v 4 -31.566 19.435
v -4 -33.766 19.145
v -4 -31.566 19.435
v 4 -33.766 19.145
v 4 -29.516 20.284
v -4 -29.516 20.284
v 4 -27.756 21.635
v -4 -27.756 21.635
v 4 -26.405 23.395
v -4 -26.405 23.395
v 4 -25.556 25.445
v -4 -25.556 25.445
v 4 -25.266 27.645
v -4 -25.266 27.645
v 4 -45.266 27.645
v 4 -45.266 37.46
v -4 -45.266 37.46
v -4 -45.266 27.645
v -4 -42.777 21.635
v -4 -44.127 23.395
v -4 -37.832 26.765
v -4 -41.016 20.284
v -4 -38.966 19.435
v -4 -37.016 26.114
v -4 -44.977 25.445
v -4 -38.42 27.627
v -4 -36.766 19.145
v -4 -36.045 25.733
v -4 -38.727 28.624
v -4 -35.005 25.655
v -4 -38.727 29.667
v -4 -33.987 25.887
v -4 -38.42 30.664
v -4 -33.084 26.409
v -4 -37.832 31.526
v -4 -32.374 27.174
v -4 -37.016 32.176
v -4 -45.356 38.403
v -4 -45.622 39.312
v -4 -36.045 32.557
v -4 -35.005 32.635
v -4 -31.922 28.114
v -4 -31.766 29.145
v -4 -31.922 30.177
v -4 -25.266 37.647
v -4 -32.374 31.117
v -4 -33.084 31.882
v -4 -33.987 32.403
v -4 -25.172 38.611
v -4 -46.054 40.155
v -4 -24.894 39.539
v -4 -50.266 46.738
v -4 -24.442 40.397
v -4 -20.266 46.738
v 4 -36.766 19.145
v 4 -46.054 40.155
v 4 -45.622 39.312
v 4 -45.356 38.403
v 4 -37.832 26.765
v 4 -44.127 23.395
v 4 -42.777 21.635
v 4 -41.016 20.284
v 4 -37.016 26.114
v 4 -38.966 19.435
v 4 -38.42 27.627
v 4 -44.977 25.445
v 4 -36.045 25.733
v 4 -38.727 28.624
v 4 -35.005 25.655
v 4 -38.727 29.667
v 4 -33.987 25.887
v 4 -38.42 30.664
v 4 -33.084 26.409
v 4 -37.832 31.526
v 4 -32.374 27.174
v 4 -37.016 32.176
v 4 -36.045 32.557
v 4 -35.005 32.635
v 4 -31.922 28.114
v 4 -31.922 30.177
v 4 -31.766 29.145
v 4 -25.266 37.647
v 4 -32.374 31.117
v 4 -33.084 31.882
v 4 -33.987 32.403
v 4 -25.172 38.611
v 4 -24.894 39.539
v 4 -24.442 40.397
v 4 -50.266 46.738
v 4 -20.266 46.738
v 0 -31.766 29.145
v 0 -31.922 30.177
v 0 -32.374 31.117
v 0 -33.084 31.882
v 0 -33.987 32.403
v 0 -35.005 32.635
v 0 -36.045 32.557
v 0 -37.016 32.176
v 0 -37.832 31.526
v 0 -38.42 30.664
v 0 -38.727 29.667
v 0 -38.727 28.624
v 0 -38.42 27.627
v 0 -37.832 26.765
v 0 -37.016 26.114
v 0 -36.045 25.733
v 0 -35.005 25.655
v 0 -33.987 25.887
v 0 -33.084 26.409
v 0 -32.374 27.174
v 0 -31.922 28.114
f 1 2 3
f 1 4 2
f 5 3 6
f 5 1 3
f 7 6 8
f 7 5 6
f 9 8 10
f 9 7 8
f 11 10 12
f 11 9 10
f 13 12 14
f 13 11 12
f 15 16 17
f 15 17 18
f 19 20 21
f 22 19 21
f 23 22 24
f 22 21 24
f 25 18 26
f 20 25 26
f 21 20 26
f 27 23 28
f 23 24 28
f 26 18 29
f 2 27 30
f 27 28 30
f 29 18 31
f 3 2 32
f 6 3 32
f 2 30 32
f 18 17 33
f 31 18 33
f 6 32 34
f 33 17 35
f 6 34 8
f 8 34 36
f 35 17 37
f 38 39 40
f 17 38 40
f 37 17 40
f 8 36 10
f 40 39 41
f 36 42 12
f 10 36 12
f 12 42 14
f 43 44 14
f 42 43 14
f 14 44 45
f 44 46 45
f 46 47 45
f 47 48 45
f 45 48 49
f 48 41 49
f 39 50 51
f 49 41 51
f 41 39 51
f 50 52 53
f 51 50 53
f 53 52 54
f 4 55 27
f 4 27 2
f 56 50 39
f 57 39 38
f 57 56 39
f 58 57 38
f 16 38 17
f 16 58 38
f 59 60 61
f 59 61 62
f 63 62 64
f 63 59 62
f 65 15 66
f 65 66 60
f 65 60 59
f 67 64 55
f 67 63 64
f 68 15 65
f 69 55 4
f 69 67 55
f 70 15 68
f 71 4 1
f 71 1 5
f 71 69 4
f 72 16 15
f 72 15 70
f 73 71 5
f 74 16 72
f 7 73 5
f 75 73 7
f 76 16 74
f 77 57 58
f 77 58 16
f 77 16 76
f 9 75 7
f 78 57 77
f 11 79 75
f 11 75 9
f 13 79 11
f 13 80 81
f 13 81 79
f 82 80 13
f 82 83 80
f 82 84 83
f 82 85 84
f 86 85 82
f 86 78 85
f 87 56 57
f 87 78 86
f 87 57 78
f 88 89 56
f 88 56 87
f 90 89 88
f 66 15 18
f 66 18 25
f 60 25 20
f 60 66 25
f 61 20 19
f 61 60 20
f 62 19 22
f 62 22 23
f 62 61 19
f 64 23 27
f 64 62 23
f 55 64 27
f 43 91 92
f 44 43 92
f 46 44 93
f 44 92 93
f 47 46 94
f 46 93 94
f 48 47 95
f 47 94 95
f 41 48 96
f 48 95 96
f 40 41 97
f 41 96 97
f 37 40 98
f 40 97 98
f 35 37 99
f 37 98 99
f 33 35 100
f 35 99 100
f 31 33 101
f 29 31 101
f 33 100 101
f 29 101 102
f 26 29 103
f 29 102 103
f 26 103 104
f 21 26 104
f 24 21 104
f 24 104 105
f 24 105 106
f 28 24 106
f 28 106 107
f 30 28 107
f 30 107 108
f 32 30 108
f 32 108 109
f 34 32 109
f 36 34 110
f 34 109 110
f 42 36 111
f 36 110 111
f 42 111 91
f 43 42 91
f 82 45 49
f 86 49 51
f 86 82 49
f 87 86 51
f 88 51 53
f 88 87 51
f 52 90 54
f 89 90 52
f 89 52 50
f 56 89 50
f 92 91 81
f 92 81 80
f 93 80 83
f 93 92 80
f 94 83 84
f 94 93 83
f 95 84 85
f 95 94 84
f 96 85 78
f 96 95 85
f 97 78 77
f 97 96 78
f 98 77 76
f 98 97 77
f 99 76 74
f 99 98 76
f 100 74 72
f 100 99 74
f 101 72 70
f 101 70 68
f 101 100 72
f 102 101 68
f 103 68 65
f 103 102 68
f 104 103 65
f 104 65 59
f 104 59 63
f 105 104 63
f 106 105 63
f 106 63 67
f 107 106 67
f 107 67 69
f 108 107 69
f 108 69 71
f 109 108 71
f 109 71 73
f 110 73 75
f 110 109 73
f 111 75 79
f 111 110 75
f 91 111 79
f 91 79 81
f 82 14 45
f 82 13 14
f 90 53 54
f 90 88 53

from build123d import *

# Parameters (mm, degrees)
F0_R          = 3.5
F1_DEPTH      = 4
F1_DEPTH_BACK = 4


with BuildPart() as f1:
    # F0 (on Right) → F1 (new body, two sides)
    with BuildSketch(Plane.YZ) as f1_sk:
        with BuildLine():
            Line((-20.266165, 46.737653), (-50.266165, 46.737653))
            Line((-50.266165, 46.737653), (-46.05444, 40.154854))
            ThreePointArc((-46.05444, 40.154854), (-45.467278, 38.863972), (-45.266165, 37.460161))
            Line((-45.266165, 37.460161), (-45.266165, 27.645153))
            ThreePointArc((-45.266165, 27.645153), (-42.776573, 21.634746), (-36.766165, 19.145153))
            Line((-36.766165, 19.145153), (-33.766165, 19.145153))
            ThreePointArc((-33.766165, 19.145153), (-27.755757, 21.634746), (-25.266165, 27.645153))
            Line((-25.266165, 27.645153), (-25.266165, 37.646666))
            ThreePointArc((-25.266165, 37.646666), (-25.055695, 39.082076), (-24.442004, 40.396642))
            Line((-24.442004, 40.396642), (-20.266165, 46.737653))
        make_face()
        with Locations((-35.266165, 29.145153)):
            Circle(F0_R, mode=Mode.SUBTRACT)
    extrude(amount=F1_DEPTH)
    extrude(f1_sk.sketch, amount=-F1_DEPTH_BACK)


solid = f1.part
